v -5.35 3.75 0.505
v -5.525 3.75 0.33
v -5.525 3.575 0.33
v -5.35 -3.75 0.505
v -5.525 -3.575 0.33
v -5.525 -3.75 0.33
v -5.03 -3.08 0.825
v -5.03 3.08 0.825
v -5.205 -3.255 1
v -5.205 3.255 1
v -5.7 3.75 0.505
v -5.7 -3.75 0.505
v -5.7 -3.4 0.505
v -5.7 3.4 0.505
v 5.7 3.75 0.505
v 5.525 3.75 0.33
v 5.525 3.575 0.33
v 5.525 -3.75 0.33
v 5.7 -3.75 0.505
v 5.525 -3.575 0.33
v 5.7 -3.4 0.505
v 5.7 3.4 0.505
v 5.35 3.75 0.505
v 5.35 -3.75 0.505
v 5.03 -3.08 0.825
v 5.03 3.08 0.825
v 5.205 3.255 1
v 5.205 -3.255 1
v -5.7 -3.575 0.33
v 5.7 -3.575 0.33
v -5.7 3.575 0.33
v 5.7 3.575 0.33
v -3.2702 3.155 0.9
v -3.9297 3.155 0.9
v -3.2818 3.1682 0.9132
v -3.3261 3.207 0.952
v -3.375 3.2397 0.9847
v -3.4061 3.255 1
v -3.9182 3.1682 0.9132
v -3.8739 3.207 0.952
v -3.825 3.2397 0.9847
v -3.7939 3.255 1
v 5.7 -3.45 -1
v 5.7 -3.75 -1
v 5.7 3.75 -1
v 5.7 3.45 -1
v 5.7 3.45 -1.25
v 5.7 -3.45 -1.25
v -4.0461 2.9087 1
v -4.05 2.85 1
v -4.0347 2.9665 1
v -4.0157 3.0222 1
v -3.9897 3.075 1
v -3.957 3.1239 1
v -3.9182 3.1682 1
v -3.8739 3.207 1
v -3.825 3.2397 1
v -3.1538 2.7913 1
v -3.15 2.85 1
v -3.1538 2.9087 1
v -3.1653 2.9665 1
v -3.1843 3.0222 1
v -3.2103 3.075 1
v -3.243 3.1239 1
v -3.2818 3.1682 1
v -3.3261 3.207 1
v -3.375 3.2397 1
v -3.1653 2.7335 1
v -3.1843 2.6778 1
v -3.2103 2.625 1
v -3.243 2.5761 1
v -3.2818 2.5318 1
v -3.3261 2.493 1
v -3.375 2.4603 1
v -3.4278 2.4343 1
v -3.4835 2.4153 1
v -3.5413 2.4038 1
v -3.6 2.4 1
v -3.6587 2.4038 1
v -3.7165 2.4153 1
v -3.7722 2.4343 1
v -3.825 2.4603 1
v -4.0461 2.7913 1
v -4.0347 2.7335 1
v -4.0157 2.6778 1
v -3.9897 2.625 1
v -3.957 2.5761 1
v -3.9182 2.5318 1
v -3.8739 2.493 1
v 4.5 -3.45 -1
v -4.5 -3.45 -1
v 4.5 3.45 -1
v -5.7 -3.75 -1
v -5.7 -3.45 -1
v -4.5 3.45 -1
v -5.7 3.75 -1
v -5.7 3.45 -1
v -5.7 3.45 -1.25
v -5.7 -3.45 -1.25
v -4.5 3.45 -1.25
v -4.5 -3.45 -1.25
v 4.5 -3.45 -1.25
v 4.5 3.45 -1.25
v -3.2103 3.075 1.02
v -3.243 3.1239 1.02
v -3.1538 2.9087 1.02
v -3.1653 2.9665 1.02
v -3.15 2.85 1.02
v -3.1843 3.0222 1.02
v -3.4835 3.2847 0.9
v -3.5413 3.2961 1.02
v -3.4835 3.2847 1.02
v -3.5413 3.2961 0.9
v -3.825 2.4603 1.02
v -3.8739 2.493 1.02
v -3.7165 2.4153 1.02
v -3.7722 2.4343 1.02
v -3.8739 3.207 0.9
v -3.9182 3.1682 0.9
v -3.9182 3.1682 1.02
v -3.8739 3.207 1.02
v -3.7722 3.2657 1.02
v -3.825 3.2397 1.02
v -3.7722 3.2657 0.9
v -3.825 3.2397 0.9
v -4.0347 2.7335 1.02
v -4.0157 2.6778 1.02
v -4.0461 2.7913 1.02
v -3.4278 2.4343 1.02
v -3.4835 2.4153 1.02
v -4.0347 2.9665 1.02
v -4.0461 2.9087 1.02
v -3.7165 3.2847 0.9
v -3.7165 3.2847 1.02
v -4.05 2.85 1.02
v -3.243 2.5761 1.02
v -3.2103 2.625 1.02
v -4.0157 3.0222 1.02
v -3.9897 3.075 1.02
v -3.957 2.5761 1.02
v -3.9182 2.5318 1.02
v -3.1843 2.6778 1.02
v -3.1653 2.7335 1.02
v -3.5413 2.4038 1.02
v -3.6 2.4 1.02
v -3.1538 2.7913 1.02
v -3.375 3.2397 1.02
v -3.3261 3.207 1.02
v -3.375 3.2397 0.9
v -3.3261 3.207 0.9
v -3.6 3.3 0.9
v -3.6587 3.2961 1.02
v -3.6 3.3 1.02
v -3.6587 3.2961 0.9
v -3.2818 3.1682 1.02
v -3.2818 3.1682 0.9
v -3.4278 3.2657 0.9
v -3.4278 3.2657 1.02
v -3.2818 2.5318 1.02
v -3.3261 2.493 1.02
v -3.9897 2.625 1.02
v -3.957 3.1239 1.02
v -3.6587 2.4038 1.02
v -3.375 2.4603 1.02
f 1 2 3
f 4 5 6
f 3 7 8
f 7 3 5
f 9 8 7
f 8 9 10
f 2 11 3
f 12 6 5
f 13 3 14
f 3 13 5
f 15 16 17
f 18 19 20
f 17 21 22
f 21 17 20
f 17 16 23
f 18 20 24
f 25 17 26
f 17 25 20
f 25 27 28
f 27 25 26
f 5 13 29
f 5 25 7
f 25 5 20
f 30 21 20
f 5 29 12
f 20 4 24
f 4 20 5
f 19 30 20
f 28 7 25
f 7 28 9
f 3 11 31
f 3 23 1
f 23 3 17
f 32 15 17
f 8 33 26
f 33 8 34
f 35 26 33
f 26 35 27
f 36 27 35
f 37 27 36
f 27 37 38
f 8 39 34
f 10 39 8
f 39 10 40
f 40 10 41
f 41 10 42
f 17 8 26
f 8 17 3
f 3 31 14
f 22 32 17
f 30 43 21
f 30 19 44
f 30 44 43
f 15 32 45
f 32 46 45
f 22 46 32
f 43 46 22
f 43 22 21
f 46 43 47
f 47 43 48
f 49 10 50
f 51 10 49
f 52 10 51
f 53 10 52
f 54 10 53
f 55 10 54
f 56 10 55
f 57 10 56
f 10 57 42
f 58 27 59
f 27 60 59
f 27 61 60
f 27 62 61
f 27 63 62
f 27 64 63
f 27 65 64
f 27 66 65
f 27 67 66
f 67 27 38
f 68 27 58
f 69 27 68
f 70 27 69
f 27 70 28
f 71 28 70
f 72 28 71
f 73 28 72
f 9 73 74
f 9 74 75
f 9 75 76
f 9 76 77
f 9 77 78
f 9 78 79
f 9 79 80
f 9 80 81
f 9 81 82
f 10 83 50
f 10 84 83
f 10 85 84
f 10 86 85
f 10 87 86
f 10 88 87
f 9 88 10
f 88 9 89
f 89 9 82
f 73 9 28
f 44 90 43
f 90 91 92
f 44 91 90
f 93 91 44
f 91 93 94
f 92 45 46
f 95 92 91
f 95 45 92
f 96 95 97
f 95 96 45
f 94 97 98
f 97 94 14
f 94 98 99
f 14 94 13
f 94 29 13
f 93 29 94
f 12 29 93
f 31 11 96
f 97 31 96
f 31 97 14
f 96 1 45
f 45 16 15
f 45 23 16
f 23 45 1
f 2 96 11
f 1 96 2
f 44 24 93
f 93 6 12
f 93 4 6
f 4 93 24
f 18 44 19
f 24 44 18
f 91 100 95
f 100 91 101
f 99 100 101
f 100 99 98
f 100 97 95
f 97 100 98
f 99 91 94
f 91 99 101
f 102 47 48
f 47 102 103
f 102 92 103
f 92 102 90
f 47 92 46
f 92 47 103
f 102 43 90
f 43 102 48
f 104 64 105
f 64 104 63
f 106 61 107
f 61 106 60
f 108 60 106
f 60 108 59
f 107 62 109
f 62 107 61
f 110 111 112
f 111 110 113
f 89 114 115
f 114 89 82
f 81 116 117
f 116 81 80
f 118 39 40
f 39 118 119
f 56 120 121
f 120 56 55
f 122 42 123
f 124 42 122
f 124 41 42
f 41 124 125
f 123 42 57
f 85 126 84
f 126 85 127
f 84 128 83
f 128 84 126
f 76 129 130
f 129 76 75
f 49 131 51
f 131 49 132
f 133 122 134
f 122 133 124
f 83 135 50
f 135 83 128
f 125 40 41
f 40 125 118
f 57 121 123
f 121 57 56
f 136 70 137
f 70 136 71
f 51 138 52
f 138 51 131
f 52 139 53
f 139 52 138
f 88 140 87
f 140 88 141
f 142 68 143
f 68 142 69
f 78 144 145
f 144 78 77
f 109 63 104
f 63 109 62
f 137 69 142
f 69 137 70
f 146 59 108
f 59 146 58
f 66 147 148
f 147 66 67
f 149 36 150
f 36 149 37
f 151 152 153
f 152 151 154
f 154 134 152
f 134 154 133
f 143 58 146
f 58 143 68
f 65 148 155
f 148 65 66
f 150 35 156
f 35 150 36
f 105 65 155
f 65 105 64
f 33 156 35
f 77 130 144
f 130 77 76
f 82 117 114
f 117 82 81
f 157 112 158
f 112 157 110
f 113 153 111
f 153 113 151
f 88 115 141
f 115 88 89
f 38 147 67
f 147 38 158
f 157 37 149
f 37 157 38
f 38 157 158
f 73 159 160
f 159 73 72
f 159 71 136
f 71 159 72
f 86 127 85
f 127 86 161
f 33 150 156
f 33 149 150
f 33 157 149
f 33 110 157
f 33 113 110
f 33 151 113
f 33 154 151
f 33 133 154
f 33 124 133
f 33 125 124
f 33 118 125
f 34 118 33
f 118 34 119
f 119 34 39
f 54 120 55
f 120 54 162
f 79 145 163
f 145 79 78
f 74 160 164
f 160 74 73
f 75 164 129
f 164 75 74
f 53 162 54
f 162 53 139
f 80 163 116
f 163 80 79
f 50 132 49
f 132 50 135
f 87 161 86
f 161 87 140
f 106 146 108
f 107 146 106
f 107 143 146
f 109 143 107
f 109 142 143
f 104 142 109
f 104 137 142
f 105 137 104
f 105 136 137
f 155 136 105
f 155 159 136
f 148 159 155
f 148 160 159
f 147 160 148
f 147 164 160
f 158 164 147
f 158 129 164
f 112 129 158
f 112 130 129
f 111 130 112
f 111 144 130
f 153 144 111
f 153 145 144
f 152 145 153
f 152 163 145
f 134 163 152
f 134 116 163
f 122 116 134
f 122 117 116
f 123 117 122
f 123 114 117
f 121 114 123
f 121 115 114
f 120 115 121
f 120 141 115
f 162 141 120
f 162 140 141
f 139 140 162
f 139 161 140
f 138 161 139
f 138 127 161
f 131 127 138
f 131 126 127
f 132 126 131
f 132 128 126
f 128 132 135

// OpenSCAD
// SMD package overall dimensions: [11.40, 7.50, 2.00]
// One connected solid with simple SMD features (end terminals, top chamfer, pin-1 mark)

L = 11.40;
W = 7.50;
H = 2.00;

eps = 0.02;
$fn = 48;

module smd_package() {

    // Feature sizing (kept within overall envelope)
    term_len = 1.20;                 // terminal length along X (each end)
    term_step = 0.25;                // terminal thickness protrusion below body (still connected)
    chamfer = 0.35;                  // top edge chamfer amount
    pin_r = 0.45;
    pin_h = 0.12;

    // Derived
    body_z0 = -H/2;
    body_z1 =  H/2;
    term_z0 = body_z0 - term_step;   // terminals extend downward
    term_z1 = body_z0 + 0.55*H;      // terminals rise into body to ensure connection

    union() {
        // Main body with a simple top chamfer (difference keeps overall size)
        difference() {
            cube([L, W, H], center=true);

            // Chamfer all around the top perimeter by subtracting 4 wedges
            // Each wedge is a rotated cube positioned by formulas from L/W/H/chamfer.
            for (sx = [-1, 1]) {
                translate([sx*(L/2 - chamfer/2), 0, body_z1 - chamfer/2])
                    rotate([0, 45, 0])
                        cube([chamfer*2, W + 2*eps, chamfer*2], center=true);
            }
            for (sy = [-1, 1]) {
                translate([0, sy*(W/2 - chamfer/2), body_z1 - chamfer/2])
                    rotate([45, 0, 0])
                        cube([L + 2*eps, chamfer*2, chamfer*2], center=true);
            }
        }

        // End terminals (connected; extend slightly below bottom)
        // Left terminal
        translate([-(L/2 - term_len/2), 0, (term_z0 + term_z1)/2])
            cube([term_len, W*0.92, (term_z1 - term_z0)], center=true);

        // Right terminal
        translate([ (L/2 - term_len/2), 0, (term_z0 + term_z1)/2])
            cube([term_len, W*0.92, (term_z1 - term_z0)], center=true);

        // Pin-1 mark: shallow embossed dot on top near one corner (kept within top face)
        translate([
            -L/2 + (term_len + pin_r + 0.45),   // inset from left end, beyond terminal region
             W/2 - (pin_r + 0.45),              // inset from top edge
             body_z1 - pin_h/2 + eps             // slight overlap into body
        ])
            cylinder(h=pin_h, r=pin_r, center=true);
    }
}

smd_package();
